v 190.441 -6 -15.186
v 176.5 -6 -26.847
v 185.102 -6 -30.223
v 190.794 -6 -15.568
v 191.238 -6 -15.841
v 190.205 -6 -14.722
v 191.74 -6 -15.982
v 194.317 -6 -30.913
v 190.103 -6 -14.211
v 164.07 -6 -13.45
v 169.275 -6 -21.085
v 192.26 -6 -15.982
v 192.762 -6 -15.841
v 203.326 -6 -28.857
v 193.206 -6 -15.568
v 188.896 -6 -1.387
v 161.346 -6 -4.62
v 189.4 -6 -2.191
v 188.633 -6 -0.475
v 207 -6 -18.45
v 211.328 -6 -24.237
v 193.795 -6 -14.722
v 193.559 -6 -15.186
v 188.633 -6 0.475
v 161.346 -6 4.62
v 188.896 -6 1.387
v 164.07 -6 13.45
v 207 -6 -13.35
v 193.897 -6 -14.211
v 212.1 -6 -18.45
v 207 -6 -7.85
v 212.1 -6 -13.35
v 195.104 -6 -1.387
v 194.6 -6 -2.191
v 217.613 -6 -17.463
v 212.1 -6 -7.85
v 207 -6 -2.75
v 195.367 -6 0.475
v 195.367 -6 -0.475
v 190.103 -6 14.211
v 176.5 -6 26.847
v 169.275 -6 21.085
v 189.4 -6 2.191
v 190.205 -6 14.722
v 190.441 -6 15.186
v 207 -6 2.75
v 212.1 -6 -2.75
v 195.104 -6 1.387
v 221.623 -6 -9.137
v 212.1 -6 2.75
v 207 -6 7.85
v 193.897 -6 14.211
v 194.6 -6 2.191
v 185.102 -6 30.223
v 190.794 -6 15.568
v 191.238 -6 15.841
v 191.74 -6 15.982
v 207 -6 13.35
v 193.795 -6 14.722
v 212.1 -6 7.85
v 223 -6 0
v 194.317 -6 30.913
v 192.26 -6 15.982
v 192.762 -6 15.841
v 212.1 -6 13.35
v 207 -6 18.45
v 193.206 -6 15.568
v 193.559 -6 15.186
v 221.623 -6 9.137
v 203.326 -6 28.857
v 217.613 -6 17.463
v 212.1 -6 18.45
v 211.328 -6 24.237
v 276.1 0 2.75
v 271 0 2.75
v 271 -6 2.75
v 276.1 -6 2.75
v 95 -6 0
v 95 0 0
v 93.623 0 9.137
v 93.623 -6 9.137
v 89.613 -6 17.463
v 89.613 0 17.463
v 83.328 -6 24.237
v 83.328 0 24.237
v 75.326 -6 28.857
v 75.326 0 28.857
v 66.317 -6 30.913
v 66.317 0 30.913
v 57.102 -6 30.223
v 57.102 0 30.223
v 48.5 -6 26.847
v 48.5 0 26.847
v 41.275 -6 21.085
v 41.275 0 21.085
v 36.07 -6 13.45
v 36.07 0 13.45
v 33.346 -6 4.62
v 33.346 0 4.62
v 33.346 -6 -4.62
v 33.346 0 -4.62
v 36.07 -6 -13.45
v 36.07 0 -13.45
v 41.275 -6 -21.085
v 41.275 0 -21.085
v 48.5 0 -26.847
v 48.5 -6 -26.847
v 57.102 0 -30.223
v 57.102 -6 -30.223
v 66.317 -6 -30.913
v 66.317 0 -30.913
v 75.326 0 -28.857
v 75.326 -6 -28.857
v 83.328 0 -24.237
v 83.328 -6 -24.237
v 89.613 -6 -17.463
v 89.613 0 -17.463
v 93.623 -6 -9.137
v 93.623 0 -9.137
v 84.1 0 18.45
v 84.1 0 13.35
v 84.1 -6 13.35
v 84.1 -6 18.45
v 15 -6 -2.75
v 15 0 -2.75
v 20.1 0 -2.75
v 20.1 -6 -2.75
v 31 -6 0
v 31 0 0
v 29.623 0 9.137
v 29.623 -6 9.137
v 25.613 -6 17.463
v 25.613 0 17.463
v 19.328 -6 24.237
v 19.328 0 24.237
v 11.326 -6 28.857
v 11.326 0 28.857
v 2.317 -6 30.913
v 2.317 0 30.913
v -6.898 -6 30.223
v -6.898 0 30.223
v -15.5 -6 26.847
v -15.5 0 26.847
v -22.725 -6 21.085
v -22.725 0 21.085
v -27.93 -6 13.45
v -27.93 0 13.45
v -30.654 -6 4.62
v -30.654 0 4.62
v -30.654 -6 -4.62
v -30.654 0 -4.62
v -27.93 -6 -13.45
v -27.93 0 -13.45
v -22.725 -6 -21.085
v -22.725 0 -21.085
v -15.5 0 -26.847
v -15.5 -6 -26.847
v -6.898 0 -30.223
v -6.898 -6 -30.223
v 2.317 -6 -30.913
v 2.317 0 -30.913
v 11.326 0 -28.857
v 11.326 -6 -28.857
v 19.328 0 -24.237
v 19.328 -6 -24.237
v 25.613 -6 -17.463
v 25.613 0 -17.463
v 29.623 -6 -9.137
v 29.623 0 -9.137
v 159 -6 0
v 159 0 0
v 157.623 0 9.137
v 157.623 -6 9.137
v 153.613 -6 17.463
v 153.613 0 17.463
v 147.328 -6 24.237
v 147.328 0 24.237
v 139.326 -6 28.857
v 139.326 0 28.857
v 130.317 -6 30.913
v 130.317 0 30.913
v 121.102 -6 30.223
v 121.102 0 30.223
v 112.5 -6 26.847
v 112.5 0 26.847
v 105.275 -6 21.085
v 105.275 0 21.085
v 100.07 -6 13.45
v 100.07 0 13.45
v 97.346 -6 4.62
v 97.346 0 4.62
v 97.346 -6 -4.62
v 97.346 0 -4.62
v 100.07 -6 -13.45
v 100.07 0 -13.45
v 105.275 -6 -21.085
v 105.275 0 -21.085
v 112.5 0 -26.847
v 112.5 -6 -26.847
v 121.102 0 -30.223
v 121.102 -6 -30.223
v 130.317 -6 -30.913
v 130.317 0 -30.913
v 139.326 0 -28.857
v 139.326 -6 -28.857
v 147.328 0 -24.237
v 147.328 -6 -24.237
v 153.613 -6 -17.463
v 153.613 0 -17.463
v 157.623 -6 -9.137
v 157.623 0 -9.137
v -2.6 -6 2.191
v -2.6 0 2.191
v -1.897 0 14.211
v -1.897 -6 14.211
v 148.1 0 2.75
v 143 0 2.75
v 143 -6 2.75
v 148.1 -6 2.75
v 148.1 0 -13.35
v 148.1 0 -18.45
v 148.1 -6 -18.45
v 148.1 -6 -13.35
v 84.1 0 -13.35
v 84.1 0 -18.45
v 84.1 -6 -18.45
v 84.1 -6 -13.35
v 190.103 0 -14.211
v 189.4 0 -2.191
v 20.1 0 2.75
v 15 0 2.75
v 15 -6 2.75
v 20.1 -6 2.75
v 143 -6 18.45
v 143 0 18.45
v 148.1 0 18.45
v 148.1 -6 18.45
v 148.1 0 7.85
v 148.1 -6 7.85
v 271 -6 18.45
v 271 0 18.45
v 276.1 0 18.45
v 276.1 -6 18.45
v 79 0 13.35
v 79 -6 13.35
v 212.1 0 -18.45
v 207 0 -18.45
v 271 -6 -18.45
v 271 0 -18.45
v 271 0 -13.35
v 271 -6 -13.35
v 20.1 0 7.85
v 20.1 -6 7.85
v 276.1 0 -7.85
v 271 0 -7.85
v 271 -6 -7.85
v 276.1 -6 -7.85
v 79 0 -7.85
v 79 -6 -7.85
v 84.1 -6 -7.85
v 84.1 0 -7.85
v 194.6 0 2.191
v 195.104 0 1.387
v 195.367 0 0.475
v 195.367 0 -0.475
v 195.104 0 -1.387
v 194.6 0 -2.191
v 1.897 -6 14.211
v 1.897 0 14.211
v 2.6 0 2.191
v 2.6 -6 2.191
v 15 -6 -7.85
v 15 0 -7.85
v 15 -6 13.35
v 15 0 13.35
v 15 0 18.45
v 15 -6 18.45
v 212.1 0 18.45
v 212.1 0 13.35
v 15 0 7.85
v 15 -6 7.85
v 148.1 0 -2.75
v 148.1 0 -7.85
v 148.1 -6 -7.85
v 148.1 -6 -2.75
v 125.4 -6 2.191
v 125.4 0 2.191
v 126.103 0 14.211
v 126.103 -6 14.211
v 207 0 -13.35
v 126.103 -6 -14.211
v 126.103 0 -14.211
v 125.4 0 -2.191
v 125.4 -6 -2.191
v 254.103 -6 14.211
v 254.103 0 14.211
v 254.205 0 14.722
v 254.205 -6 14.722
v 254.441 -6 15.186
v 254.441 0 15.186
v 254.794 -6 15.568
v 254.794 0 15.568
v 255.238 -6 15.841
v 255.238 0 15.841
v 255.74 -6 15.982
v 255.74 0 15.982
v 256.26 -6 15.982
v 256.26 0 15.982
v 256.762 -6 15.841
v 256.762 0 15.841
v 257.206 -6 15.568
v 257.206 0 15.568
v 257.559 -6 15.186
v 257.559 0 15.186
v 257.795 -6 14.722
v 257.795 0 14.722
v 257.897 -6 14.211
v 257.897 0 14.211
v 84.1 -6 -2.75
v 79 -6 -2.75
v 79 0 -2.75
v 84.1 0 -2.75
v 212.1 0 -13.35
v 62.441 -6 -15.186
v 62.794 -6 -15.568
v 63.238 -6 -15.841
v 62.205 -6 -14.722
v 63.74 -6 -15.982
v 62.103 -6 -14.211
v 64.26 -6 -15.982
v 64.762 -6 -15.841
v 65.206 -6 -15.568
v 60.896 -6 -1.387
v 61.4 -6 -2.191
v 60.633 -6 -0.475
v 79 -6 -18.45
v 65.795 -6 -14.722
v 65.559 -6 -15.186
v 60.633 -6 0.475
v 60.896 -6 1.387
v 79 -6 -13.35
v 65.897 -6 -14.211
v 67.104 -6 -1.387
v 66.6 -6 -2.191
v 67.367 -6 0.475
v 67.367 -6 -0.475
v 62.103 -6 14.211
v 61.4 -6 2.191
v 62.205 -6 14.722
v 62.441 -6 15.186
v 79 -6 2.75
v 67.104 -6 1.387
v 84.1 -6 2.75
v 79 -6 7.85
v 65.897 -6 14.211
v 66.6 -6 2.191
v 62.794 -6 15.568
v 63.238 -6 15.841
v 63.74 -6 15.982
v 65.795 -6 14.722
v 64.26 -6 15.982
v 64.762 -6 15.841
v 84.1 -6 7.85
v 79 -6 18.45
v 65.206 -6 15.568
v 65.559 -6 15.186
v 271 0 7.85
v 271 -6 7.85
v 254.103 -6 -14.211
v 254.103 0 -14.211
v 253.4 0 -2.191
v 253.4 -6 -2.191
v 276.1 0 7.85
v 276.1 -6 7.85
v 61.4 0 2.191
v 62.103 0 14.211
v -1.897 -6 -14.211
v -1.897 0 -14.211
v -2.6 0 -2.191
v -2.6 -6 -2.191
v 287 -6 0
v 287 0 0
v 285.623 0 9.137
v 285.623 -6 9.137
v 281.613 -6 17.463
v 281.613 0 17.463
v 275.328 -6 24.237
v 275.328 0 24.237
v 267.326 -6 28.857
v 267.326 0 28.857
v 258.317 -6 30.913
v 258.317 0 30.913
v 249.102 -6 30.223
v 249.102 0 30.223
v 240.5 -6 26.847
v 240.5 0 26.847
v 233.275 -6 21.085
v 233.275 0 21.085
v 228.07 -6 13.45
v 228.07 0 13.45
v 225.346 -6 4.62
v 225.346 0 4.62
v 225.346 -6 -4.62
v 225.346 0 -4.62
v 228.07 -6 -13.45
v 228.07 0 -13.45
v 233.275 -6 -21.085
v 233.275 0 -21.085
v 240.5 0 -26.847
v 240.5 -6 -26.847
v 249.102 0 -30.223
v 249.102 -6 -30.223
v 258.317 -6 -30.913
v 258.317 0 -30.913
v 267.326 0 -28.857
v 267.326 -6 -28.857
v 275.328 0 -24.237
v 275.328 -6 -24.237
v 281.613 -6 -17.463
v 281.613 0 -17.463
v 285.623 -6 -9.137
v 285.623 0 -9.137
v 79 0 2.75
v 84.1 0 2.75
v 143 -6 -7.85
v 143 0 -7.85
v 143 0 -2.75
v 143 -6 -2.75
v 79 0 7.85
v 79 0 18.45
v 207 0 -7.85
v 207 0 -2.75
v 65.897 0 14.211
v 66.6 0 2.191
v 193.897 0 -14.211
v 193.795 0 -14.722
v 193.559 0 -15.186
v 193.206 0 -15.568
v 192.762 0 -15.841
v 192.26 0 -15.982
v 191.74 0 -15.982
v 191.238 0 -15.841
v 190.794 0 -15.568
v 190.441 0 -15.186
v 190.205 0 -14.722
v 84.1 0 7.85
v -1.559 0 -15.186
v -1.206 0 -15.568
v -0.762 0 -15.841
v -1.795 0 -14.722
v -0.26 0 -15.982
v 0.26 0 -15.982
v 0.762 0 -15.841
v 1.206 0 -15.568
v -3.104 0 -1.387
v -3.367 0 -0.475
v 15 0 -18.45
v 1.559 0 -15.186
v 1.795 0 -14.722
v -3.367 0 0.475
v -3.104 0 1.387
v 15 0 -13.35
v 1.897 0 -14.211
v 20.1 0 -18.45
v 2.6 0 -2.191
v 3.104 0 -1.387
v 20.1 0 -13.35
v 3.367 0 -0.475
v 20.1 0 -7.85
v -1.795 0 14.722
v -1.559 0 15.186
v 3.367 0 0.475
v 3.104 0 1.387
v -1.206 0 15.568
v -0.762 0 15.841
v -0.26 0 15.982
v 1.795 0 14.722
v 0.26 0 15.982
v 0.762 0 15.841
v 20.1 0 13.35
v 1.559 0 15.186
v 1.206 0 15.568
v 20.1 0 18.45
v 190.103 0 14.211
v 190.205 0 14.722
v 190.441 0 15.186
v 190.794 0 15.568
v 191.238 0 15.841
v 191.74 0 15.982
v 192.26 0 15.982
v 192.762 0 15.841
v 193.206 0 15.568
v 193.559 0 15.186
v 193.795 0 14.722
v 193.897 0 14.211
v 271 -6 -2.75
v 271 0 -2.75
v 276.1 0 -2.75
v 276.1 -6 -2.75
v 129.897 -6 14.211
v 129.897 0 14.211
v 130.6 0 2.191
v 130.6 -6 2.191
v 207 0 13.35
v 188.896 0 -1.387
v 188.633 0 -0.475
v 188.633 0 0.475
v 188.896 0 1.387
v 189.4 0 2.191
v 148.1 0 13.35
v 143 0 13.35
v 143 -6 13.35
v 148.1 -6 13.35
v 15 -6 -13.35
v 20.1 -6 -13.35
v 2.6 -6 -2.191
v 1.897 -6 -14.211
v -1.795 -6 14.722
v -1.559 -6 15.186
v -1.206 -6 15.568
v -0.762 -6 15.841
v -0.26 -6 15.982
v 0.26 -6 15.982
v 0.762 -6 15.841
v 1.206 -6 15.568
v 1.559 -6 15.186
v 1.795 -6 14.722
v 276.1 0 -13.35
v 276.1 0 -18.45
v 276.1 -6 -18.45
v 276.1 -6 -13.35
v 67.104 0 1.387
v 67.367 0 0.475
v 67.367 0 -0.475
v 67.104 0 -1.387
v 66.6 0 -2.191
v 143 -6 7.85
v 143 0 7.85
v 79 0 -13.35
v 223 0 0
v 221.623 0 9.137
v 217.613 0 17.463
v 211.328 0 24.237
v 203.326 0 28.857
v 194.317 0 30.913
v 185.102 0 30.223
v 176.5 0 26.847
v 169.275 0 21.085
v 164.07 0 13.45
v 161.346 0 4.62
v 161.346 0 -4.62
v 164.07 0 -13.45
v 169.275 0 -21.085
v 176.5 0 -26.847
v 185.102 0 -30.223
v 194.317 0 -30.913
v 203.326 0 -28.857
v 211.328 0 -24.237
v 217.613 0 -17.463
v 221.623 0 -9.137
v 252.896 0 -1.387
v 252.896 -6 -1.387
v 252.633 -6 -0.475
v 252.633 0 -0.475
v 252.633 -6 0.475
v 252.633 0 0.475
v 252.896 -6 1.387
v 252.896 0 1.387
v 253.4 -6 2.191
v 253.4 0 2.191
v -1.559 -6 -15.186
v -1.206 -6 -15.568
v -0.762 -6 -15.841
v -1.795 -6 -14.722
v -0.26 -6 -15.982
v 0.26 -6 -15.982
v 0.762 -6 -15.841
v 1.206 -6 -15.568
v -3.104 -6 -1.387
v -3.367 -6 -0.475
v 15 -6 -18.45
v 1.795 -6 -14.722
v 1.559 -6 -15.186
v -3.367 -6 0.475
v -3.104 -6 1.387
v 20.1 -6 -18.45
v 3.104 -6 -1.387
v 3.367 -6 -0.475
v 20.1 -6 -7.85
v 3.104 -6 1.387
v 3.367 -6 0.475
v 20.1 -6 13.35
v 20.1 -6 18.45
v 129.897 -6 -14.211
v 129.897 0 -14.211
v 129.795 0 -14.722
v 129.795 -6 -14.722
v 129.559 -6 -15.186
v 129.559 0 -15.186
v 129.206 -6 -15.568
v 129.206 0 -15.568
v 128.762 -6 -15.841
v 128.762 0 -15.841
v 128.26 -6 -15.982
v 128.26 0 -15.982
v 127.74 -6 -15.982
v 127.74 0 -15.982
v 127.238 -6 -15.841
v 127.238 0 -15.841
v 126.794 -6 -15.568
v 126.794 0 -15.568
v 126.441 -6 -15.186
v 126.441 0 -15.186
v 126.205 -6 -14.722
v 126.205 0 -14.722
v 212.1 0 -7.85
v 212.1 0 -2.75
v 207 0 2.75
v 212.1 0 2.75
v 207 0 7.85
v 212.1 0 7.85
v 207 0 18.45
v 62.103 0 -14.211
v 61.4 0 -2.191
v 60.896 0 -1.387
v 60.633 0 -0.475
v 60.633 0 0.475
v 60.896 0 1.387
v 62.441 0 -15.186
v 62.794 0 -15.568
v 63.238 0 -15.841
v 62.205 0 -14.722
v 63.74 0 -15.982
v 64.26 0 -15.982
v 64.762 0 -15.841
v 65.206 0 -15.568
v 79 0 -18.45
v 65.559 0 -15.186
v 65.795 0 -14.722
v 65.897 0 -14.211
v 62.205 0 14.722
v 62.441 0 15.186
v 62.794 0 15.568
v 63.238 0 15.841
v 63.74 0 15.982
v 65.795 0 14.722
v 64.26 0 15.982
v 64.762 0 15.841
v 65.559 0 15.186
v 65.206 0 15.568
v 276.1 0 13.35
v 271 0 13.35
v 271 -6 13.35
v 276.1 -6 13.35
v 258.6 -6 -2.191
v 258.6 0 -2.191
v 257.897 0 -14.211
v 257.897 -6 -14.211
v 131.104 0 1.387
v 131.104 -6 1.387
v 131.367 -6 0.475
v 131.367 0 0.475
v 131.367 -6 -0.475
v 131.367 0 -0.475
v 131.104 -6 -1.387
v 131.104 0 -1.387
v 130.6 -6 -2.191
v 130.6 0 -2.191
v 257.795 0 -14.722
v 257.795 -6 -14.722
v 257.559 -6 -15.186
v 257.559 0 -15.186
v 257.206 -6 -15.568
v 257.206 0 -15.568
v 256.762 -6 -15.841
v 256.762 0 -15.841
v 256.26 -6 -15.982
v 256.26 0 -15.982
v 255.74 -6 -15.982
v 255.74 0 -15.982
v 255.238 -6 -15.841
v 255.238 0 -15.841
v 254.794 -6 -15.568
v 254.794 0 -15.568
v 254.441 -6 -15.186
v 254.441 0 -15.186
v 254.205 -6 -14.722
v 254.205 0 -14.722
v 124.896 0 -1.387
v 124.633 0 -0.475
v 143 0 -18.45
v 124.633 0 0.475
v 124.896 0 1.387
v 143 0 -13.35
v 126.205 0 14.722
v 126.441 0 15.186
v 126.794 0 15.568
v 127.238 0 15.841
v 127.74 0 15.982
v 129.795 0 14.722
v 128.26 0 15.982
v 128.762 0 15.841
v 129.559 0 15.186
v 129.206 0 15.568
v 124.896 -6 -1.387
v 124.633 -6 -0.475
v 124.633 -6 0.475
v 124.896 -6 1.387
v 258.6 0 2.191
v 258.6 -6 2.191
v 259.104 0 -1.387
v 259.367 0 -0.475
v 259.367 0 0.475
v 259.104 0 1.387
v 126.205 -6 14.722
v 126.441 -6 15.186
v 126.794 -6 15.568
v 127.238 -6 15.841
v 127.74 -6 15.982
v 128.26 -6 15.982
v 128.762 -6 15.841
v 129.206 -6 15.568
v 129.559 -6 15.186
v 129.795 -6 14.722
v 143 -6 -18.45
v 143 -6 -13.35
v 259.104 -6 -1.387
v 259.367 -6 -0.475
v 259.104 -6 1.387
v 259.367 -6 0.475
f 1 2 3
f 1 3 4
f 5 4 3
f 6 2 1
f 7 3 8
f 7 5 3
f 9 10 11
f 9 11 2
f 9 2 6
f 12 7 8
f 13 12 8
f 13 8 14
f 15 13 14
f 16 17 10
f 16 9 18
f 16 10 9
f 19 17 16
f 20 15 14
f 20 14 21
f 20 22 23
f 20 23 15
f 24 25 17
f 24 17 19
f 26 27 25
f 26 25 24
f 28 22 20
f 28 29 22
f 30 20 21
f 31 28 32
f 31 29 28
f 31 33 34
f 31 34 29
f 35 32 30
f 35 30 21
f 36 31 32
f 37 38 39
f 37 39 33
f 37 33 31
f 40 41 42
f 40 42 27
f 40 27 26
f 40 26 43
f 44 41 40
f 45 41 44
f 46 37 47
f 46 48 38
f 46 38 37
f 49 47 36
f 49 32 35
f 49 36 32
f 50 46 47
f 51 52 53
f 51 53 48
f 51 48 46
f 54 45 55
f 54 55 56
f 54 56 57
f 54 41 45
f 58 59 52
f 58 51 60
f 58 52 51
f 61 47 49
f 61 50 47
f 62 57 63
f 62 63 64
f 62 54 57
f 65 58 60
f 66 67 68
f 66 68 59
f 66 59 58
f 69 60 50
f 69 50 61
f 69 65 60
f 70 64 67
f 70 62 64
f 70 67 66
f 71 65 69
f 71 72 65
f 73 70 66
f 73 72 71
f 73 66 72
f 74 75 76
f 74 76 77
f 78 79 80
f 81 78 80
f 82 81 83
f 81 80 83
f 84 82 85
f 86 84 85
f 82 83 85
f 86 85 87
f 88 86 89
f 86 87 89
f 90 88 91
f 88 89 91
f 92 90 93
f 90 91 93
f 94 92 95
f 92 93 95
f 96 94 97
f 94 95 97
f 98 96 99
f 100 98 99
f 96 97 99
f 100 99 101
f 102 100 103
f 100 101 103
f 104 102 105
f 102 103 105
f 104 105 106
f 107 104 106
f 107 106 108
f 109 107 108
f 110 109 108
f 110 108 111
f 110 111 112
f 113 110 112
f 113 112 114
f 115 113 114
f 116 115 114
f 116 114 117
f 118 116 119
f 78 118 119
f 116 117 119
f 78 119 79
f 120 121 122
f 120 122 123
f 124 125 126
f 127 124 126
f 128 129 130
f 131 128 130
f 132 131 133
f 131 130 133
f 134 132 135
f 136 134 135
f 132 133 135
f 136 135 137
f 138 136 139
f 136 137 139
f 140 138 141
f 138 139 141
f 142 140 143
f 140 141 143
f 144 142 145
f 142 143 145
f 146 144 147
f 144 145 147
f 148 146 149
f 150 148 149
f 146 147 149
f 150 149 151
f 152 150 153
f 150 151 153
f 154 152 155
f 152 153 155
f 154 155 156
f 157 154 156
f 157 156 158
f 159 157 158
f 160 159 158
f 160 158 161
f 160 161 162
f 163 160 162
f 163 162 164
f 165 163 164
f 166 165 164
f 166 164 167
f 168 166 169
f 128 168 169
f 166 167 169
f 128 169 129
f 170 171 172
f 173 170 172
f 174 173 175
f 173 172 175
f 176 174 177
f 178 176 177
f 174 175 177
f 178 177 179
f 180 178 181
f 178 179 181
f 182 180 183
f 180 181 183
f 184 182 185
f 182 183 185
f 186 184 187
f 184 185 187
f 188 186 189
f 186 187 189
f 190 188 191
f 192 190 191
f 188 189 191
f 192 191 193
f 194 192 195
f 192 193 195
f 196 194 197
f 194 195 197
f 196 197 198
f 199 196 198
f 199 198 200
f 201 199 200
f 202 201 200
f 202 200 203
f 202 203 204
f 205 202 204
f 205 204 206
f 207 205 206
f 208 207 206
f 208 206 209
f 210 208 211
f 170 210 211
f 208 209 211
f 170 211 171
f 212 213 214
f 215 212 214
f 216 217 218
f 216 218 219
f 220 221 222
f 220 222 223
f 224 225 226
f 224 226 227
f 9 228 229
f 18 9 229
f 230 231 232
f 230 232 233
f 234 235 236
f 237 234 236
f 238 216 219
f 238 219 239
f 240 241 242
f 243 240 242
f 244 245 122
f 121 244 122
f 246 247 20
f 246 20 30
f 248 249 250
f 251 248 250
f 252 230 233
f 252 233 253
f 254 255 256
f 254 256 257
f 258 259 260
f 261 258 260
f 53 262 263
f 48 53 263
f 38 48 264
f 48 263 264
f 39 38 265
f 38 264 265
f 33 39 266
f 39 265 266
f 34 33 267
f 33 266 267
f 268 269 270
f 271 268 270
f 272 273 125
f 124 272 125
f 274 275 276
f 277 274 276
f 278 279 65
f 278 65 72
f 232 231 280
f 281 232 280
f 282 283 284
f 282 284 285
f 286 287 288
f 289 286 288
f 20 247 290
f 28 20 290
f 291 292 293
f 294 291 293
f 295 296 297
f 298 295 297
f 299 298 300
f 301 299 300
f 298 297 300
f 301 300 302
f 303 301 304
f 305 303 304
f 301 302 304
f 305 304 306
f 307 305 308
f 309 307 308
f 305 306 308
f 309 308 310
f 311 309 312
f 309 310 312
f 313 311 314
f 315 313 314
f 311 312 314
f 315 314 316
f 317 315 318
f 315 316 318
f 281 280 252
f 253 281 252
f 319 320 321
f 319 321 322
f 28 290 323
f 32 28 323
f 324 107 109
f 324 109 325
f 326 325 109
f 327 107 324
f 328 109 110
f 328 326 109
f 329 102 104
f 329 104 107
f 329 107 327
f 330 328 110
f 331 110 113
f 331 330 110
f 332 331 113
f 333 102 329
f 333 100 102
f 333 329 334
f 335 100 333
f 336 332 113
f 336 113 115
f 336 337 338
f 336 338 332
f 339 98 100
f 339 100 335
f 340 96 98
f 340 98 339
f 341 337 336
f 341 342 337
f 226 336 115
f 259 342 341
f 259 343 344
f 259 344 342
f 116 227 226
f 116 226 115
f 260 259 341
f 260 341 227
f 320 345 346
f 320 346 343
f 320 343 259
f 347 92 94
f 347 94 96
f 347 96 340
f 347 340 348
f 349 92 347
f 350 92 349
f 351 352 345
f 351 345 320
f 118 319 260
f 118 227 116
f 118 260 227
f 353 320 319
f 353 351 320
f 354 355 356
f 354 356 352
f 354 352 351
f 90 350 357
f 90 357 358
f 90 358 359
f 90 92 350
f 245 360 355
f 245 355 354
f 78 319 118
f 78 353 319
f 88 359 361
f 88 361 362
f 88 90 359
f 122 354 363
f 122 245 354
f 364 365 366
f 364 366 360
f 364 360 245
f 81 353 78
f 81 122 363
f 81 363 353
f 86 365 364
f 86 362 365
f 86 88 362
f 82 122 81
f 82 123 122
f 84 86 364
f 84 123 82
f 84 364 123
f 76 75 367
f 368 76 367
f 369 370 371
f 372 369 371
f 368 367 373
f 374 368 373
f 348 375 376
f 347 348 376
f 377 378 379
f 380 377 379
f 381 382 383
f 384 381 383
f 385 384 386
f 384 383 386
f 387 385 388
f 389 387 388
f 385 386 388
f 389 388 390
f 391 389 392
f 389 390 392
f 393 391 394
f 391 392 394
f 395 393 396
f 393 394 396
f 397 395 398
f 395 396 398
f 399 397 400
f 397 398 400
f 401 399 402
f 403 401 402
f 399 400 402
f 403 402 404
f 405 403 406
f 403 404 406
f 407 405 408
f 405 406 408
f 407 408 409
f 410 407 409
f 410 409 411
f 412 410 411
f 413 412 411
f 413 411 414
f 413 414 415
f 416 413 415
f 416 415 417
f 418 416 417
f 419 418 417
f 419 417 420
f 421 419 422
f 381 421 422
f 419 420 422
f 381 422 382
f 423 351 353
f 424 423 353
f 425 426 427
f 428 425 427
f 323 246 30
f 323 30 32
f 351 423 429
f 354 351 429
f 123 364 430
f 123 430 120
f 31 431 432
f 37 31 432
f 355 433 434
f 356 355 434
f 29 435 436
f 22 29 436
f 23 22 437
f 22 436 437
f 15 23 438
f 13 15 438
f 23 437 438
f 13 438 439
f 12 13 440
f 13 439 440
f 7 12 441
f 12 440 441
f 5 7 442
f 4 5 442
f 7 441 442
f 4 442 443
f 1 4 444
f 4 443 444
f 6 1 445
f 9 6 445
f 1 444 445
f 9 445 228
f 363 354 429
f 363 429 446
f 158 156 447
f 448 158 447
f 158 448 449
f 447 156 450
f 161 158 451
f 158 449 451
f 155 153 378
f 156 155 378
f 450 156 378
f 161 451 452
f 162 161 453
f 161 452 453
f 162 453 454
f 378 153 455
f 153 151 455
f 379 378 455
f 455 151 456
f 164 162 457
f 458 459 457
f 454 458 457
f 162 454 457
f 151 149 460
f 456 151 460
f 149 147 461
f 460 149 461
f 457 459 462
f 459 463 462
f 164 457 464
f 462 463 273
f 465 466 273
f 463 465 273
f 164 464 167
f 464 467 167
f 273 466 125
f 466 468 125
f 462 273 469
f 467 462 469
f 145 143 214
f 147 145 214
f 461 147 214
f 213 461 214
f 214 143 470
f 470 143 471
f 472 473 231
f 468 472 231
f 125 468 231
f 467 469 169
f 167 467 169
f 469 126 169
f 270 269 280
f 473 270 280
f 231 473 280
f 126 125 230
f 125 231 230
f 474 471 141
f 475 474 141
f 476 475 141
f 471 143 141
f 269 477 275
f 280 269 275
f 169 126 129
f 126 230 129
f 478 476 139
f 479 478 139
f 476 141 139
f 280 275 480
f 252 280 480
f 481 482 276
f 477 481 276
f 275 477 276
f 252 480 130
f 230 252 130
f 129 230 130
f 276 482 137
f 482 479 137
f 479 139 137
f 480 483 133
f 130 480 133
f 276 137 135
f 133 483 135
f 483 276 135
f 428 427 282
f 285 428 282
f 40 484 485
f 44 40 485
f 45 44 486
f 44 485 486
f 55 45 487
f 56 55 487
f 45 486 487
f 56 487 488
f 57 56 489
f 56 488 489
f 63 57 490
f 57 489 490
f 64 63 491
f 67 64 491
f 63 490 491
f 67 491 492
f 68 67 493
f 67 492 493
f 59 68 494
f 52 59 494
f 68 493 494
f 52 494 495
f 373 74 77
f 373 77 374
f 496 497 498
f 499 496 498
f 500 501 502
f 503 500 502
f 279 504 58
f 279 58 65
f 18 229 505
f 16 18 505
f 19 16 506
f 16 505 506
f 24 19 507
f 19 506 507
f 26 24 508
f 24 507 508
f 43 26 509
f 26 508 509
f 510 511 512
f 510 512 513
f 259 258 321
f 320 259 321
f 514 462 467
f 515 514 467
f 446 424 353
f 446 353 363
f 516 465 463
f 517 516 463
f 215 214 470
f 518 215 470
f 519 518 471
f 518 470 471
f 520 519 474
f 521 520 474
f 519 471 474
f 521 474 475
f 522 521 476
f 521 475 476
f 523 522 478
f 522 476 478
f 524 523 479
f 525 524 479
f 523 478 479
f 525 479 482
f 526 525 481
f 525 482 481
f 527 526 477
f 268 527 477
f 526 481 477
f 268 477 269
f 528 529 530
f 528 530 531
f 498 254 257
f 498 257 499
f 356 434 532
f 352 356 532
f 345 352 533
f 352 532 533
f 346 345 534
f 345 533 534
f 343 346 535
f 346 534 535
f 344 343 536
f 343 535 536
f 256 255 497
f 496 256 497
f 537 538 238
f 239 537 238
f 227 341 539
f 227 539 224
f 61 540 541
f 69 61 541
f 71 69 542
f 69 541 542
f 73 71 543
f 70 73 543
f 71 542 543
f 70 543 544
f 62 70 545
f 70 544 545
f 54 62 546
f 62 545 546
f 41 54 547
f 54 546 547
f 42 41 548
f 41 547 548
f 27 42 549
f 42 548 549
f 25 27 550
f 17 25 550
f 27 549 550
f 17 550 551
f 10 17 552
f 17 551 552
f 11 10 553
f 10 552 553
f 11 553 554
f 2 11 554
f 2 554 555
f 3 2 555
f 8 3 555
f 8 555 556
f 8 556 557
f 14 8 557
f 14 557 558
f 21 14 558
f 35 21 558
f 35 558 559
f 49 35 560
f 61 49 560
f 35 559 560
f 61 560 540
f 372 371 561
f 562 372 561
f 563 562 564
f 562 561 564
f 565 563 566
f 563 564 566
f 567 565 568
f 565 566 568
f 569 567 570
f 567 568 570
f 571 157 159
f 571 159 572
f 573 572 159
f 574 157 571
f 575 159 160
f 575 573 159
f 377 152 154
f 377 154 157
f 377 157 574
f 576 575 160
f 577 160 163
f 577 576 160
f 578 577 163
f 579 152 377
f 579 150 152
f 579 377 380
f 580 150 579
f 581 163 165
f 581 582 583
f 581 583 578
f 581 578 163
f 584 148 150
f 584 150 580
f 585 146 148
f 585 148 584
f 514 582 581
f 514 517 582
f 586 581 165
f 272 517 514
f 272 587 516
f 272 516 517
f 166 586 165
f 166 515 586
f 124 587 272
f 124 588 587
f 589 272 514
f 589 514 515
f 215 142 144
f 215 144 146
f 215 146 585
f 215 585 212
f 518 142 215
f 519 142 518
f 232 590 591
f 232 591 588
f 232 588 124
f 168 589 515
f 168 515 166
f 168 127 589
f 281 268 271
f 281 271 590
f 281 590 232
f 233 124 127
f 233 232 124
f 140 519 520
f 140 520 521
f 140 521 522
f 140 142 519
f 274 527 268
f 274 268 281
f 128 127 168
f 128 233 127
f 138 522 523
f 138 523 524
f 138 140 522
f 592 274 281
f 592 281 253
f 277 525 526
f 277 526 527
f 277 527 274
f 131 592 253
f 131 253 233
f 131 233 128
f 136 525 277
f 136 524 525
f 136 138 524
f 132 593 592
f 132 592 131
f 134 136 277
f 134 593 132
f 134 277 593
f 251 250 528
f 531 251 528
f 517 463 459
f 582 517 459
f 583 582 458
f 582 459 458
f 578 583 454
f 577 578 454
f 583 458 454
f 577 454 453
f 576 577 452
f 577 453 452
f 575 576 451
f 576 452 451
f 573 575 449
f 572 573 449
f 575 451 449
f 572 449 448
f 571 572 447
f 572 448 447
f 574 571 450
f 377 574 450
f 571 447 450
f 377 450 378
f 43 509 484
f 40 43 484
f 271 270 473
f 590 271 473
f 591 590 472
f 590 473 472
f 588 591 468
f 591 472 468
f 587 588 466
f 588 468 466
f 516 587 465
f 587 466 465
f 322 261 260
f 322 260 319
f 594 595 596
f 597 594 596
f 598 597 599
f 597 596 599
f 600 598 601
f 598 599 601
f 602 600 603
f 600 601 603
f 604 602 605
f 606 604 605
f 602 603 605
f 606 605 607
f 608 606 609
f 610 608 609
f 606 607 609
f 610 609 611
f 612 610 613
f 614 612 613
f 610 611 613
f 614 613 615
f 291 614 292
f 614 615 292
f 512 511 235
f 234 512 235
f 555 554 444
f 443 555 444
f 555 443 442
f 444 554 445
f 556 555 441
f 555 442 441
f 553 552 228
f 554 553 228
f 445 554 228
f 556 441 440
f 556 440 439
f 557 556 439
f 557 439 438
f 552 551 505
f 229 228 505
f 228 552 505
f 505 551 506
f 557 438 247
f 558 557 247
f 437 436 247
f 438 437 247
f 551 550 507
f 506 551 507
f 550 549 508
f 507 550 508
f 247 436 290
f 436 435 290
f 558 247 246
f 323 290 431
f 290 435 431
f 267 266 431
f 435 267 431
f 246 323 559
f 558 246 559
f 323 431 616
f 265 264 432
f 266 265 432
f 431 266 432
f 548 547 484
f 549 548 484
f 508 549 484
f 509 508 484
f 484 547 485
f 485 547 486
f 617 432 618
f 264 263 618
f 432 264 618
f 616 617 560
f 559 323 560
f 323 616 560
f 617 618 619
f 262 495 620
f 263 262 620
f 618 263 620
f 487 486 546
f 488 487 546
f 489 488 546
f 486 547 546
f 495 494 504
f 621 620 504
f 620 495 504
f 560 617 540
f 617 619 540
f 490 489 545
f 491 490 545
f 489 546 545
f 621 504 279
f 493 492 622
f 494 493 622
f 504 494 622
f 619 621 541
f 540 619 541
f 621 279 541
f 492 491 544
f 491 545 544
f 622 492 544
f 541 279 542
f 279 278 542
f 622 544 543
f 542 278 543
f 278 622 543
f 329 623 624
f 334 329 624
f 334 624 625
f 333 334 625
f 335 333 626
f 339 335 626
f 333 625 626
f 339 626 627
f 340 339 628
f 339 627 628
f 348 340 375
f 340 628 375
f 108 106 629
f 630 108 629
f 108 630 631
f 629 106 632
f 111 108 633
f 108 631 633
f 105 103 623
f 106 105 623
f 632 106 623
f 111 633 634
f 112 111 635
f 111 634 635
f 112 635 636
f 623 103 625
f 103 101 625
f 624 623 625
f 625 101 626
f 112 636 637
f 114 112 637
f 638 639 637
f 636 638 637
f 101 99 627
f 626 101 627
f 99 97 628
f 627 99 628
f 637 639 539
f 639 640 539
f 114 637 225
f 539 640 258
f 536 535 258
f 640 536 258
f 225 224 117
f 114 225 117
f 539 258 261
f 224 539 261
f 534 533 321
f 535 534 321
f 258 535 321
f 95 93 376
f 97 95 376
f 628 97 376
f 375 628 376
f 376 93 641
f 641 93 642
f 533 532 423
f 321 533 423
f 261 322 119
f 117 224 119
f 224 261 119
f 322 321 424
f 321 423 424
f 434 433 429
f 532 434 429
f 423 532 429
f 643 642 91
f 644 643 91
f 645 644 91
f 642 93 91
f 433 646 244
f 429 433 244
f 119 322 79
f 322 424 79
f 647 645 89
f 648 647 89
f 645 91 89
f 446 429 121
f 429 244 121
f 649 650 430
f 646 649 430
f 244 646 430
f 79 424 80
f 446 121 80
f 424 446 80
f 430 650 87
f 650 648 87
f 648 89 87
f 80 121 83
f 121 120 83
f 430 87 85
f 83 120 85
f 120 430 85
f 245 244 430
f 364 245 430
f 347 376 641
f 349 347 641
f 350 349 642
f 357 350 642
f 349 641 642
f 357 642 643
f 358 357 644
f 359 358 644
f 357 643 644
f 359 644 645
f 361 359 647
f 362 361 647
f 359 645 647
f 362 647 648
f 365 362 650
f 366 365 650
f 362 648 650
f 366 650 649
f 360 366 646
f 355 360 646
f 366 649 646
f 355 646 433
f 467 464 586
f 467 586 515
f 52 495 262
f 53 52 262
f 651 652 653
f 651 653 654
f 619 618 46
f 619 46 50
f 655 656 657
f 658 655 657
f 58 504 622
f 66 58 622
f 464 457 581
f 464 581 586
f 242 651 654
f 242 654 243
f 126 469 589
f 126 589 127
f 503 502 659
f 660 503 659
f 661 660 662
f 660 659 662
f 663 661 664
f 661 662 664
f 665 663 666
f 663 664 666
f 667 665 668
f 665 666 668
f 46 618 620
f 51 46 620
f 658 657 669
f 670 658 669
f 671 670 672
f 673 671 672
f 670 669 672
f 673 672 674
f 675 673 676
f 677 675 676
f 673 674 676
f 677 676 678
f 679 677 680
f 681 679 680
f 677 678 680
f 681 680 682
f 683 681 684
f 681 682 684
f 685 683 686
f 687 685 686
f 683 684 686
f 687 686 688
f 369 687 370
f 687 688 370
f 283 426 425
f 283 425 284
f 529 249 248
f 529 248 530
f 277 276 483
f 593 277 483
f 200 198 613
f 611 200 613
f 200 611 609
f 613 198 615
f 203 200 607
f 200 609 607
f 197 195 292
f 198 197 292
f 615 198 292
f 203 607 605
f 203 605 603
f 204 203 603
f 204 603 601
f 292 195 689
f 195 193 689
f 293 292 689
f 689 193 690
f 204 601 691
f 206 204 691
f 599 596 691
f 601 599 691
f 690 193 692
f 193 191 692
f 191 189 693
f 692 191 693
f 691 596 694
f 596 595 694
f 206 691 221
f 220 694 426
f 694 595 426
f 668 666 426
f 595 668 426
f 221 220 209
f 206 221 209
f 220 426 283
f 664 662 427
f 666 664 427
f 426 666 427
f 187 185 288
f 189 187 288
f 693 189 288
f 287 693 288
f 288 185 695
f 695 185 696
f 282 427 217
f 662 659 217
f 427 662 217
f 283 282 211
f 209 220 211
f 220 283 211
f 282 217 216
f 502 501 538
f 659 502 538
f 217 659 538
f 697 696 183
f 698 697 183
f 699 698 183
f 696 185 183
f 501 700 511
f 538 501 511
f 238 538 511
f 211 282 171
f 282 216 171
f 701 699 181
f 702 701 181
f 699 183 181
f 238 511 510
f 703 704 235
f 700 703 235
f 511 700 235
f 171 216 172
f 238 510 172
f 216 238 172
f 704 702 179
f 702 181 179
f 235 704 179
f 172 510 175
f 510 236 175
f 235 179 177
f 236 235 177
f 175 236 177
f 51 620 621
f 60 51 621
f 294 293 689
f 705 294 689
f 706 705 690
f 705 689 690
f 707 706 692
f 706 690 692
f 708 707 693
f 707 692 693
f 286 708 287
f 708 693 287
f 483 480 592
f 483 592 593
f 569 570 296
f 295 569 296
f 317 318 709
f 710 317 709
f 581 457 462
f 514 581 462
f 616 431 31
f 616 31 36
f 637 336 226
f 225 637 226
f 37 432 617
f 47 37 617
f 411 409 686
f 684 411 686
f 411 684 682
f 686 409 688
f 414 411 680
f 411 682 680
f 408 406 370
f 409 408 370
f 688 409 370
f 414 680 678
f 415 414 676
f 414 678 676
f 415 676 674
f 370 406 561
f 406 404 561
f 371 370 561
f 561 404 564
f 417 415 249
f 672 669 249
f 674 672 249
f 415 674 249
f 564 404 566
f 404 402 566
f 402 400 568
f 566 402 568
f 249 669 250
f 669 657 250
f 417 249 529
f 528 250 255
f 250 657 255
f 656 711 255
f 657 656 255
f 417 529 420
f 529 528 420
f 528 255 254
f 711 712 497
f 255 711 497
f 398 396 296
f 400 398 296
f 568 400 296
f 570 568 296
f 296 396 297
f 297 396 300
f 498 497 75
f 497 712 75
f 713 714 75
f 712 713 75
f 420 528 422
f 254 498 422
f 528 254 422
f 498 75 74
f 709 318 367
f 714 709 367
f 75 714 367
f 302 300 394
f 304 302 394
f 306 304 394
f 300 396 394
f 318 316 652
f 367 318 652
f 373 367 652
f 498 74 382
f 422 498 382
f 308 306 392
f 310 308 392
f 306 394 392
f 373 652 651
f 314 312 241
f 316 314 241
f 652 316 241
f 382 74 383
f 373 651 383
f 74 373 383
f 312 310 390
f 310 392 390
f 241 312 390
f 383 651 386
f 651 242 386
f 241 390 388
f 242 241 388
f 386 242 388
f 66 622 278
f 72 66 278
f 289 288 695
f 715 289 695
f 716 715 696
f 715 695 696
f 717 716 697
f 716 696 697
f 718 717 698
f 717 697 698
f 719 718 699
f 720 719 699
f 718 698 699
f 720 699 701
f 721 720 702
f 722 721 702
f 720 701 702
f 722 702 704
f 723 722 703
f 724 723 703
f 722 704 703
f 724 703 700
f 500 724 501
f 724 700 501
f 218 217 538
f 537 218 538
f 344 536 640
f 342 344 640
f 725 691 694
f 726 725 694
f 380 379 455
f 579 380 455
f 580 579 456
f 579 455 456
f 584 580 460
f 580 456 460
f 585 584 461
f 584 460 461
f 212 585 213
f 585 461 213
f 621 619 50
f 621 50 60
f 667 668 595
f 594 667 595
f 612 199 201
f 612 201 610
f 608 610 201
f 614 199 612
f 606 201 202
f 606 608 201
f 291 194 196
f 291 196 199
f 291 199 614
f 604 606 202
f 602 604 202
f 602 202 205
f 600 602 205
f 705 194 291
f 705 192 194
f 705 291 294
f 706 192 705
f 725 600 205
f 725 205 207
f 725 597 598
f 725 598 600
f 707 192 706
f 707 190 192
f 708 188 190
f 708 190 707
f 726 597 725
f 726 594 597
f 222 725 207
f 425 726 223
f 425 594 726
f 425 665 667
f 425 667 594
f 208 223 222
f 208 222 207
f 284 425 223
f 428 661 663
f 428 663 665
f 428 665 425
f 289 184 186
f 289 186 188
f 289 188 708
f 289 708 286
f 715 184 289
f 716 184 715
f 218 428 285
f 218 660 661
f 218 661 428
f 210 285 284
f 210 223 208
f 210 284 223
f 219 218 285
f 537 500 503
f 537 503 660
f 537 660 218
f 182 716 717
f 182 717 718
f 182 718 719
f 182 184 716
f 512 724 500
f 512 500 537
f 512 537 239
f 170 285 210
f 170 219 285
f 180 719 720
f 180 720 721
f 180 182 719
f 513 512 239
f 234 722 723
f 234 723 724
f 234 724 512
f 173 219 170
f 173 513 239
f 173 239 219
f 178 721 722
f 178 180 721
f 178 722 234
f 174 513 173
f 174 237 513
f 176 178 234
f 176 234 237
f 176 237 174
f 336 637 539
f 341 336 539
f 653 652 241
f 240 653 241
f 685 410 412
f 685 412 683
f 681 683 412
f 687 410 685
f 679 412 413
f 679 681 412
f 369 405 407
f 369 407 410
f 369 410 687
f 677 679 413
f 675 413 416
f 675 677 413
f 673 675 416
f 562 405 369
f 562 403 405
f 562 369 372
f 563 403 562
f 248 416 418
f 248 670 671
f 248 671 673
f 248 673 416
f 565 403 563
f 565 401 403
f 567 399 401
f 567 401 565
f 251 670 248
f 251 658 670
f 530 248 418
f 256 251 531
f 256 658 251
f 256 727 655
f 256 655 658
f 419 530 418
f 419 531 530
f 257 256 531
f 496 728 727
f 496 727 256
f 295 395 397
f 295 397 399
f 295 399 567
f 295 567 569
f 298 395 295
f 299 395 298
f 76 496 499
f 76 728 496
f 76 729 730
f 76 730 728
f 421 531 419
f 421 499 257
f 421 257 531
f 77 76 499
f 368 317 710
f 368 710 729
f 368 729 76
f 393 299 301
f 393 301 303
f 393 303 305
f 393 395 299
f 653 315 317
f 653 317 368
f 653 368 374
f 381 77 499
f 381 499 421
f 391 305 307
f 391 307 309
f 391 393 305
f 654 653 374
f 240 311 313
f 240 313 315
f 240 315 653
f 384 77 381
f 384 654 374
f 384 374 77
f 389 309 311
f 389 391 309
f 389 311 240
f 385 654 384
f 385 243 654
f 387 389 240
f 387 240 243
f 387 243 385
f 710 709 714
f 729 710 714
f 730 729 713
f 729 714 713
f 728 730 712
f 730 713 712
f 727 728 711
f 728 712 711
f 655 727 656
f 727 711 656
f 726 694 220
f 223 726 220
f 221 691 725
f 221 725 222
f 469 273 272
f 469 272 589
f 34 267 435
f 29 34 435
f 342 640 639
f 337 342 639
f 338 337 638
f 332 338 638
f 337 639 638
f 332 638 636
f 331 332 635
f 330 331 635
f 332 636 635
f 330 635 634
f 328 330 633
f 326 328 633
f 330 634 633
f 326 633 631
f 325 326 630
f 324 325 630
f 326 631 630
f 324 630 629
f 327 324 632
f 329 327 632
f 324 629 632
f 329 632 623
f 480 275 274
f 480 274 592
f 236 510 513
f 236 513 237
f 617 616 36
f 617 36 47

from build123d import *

# Parameters (mm, degrees)
F0_R     = 31
F0_W     = 5.1
F0_H     = 5.1
F1_DEPTH = 6


with BuildPart() as f1:
    # F0 (on Front) → F1 (new body)
    with BuildSketch(Plane.XZ):
        Circle(F0_R)
        with Locations((17.55, -15.9)):
            Rectangle(F0_W, F0_H, mode=Mode.SUBTRACT)
        with Locations((17.55, -5.3)):
            Rectangle(F0_W, F0_H, mode=Mode.SUBTRACT)
        with BuildLine():
            Line((-2.6, 2.19089), (-1.896757, 14.210971))
            ThreePointArc((-1.896757, 14.210971), (0, 16), (1.896757, 14.210971))
            Line((1.896757, 14.210971), (2.6, 2.19089))
            ThreePointArc((2.6, 2.19089), (3.4, 0), (2.6, -2.19089))
            Line((2.6, -2.19089), (1.896757, -14.210971))
            ThreePointArc((1.896757, -14.210971), (0, -16), (-1.896757, -14.210971))
            Line((-1.896757, -14.210971), (-2.6, -2.19089))
            ThreePointArc((-2.6, -2.19089), (-3.4, 0), (-2.6, 2.19089))
        make_face(mode=Mode.SUBTRACT)
        with Locations((17.55, 5.3)):
            Rectangle(F0_W, F0_H, mode=Mode.SUBTRACT)
        with Locations((17.55, 15.9)):
            Rectangle(F0_W, F0_H, mode=Mode.SUBTRACT)
        with Locations((64, 0)):
            Circle(F0_R)
        with Locations((81.55, -15.9)):
            Rectangle(F0_W, F0_H, mode=Mode.SUBTRACT)
        with Locations((81.55, -5.3)):
            Rectangle(F0_W, F0_H, mode=Mode.SUBTRACT)
        with BuildLine():
            Line((65.896757, 14.210971), (66.6, 2.19089))
            ThreePointArc((66.6, 2.19089), (67.4, 0), (66.6, -2.19089))
            Line((66.6, -2.19089), (65.896757, -14.210971))
            ThreePointArc((65.896757, -14.210971), (64, -16), (62.103243, -14.210971))
            Line((62.103243, -14.210971), (61.4, -2.19089))
            ThreePointArc((61.4, -2.19089), (60.6, 0), (61.4, 2.19089))
            Line((61.4, 2.19089), (62.103243, 14.210971))
            ThreePointArc((62.103243, 14.210971), (64, 16), (65.896757, 14.210971))
        make_face(mode=Mode.SUBTRACT)
        with Locations((81.55, 5.3)):
            Rectangle(F0_W, F0_H, mode=Mode.SUBTRACT)
        with Locations((81.55, 15.9)):
            Rectangle(F0_W, F0_H, mode=Mode.SUBTRACT)
        with Locations((128, 0)):
            Circle(F0_R)
        with Locations((145.55, -15.9)):
            Rectangle(F0_W, F0_H, mode=Mode.SUBTRACT)
        with Locations((145.55, -5.3)):
            Rectangle(F0_W, F0_H, mode=Mode.SUBTRACT)
        with BuildLine():
            Line((129.896757, 14.210971), (130.6, 2.19089))
            ThreePointArc((130.6, 2.19089), (131.4, 0), (130.6, -2.19089))
            Line((130.6, -2.19089), (129.896757, -14.210971))
            ThreePointArc((129.896757, -14.210971), (128, -16), (126.103243, -14.210971))
            Line((126.103243, -14.210971), (125.4, -2.19089))
            ThreePointArc((125.4, -2.19089), (124.6, 0), (125.4, 2.19089))
            Line((125.4, 2.19089), (126.103243, 14.210971))
            ThreePointArc((126.103243, 14.210971), (128, 16), (129.896757, 14.210971))
        make_face(mode=Mode.SUBTRACT)
        with Locations((145.55, 5.3)):
            Rectangle(F0_W, F0_H, mode=Mode.SUBTRACT)
        with Locations((145.55, 15.9)):
            Rectangle(F0_W, F0_H, mode=Mode.SUBTRACT)
        with Locations((192, 0)):
            Circle(F0_R)
        with Locations((209.55, -15.9)):
            Rectangle(F0_W, F0_H, mode=Mode.SUBTRACT)
        with Locations((209.55, -5.3)):
            Rectangle(F0_W, F0_H, mode=Mode.SUBTRACT)
        with BuildLine():
            Line((193.896757, 14.210971), (194.6, 2.19089))
            ThreePointArc((194.6, 2.19089), (195.4, 0), (194.6, -2.19089))
            Line((194.6, -2.19089), (193.896757, -14.210971))
            ThreePointArc((193.896757, -14.210971), (192, -16), (190.103243, -14.210971))
            Line((190.103243, -14.210971), (189.4, -2.19089))
            ThreePointArc((189.4, -2.19089), (188.6, 0), (189.4, 2.19089))
            Line((189.4, 2.19089), (190.103243, 14.210971))
            ThreePointArc((190.103243, 14.210971), (192, 16), (193.896757, 14.210971))
        make_face(mode=Mode.SUBTRACT)
        with Locations((209.55, 5.3)):
            Rectangle(F0_W, F0_H, mode=Mode.SUBTRACT)
        with Locations((209.55, 15.9)):
            Rectangle(F0_W, F0_H, mode=Mode.SUBTRACT)
        with Locations((256, 0)):
            Circle(F0_R)
        with Locations((273.55, -15.9)):
            Rectangle(F0_W, F0_H, mode=Mode.SUBTRACT)
        with Locations((273.55, -5.3)):
            Rectangle(F0_W, F0_H, mode=Mode.SUBTRACT)
        with BuildLine():
            Line((257.896757, 14.210971), (258.6, 2.19089))
            ThreePointArc((258.6, 2.19089), (259.4, 0), (258.6, -2.19089))
            Line((258.6, -2.19089), (257.896757, -14.210971))
            ThreePointArc((257.896757, -14.210971), (256, -16), (254.103243, -14.210971))
            Line((254.103243, -14.210971), (253.4, -2.19089))
            ThreePointArc((253.4, -2.19089), (252.6, 0), (253.4, 2.19089))
            Line((253.4, 2.19089), (254.103243, 14.210971))
            ThreePointArc((254.103243, 14.210971), (256, 16), (257.896757, 14.210971))
        make_face(mode=Mode.SUBTRACT)
        with Locations((273.55, 5.3)):
            Rectangle(F0_W, F0_H, mode=Mode.SUBTRACT)
        with Locations((273.55, 15.9)):
            Rectangle(F0_W, F0_H, mode=Mode.SUBTRACT)
    extrude(amount=F1_DEPTH)


solid = f1.part
